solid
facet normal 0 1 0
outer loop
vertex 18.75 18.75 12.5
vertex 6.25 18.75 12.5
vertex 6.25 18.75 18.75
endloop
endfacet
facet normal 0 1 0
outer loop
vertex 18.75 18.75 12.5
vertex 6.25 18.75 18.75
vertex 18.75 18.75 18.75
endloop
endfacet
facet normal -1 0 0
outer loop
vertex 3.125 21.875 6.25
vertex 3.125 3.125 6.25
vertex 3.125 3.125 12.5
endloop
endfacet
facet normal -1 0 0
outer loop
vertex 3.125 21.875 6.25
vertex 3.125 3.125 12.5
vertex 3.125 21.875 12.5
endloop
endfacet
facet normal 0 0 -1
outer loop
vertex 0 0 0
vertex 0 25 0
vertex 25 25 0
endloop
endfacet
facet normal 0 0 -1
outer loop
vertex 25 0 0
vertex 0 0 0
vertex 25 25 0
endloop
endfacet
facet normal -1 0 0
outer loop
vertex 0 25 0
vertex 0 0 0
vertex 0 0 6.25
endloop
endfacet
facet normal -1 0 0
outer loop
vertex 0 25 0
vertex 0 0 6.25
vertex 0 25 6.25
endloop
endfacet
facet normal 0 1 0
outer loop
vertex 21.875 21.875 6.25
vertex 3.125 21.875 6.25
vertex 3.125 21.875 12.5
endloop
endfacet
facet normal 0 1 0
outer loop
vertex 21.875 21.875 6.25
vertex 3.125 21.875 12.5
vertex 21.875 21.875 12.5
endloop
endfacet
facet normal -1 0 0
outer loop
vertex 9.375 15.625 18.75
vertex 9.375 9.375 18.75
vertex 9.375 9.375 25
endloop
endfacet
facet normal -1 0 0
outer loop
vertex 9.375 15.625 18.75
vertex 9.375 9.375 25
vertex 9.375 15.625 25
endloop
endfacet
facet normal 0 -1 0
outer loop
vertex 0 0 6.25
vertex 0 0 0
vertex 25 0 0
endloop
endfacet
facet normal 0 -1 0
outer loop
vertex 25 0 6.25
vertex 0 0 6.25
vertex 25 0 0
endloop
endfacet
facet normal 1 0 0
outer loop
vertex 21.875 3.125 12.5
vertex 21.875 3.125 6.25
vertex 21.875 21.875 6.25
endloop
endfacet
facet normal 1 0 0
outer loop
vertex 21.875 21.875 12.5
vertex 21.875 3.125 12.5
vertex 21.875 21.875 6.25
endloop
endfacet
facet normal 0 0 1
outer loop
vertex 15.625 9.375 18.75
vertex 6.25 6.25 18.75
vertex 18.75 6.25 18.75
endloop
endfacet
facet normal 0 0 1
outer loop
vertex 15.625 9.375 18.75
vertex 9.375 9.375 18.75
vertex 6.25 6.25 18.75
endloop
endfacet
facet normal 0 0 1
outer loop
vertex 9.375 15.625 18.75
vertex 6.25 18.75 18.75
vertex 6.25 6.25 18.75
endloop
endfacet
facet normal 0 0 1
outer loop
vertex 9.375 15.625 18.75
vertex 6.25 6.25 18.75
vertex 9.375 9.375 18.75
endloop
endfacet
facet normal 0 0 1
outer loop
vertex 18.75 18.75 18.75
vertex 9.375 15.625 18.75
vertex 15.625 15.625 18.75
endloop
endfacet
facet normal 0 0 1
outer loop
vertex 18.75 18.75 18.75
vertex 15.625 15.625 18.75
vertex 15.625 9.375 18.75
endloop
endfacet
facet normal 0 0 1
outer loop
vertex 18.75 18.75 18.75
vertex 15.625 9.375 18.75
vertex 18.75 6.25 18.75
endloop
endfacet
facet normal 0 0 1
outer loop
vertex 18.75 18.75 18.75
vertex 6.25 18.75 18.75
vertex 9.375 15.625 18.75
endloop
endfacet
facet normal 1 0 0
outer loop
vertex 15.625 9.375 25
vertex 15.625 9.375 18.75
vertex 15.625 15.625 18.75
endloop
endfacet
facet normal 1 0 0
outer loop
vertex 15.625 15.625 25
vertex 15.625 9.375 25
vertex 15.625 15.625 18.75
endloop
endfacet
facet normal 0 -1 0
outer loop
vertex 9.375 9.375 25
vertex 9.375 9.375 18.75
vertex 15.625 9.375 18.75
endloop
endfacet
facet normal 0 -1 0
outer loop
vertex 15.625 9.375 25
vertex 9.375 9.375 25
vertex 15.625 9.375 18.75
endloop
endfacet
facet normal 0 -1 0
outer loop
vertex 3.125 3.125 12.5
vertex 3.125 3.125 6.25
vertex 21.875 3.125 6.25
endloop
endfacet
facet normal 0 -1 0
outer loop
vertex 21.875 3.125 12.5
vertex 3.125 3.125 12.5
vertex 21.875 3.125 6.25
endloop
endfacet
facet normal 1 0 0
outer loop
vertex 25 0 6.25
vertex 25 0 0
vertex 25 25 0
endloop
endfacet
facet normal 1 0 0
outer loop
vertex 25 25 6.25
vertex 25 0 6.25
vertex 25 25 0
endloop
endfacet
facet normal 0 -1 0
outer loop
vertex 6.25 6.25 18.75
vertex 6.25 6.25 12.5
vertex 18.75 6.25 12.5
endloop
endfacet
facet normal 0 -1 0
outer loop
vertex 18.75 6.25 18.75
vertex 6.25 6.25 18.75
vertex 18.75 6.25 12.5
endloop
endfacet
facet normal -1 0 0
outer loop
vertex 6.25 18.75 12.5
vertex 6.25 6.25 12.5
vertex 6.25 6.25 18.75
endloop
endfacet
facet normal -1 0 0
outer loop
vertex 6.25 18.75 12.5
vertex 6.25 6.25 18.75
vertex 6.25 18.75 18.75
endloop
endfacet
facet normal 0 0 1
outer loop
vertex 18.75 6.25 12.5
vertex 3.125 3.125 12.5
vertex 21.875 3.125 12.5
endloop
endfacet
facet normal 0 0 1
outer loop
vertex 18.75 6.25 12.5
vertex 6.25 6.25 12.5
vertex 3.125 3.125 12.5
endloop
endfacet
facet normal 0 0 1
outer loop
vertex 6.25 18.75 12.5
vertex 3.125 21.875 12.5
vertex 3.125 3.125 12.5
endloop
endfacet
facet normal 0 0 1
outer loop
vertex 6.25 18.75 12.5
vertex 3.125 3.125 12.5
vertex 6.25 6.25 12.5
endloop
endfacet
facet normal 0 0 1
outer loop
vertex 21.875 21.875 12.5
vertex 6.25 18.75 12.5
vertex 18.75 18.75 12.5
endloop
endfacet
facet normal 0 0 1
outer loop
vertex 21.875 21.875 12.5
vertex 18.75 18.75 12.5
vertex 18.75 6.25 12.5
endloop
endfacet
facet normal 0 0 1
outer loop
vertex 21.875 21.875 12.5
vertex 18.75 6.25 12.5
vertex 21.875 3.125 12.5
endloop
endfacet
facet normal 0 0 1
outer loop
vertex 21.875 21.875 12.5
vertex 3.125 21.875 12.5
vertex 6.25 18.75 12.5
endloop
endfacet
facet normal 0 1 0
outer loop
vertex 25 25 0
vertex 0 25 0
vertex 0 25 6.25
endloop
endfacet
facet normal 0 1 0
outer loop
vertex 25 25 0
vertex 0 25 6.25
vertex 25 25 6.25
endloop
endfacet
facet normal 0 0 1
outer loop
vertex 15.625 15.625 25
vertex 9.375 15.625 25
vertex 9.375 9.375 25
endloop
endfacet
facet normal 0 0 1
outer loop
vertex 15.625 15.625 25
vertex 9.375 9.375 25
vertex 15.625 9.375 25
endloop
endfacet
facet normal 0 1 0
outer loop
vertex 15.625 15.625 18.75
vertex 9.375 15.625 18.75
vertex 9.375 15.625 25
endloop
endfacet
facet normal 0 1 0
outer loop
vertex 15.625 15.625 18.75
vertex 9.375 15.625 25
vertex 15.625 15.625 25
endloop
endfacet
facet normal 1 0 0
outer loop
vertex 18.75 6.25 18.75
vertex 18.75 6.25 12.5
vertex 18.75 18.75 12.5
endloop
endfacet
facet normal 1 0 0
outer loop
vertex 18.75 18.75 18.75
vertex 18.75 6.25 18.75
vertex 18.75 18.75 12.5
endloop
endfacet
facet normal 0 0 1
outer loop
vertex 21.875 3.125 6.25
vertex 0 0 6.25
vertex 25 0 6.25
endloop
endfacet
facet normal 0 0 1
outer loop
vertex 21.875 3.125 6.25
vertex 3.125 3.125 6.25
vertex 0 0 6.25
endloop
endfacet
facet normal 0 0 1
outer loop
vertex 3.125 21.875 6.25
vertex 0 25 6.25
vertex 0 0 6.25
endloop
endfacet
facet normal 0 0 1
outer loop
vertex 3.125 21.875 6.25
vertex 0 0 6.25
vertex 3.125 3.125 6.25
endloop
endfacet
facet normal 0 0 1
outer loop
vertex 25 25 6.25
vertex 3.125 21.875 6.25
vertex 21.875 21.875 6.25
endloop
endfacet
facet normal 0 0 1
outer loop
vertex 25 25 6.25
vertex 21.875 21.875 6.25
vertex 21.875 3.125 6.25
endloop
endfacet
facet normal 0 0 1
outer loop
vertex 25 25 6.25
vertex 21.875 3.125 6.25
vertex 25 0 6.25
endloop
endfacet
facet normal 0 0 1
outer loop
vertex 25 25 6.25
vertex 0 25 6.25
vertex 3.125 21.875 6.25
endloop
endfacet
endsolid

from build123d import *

# Parameters (mm, degrees)
F1_W     = 25
F1_H     = 25
F1_W_2   = 18.75
F1_H_2   = 18.75
F2_DEPTH = 6.25
F1_W_3   = 12.5
F1_H_3   = 12.5
F3_DEPTH = 12.5
F1_W_4   = 6.25
F1_H_4   = 6.25
F4_DEPTH = 18.75
F5_DEPTH = 25


with BuildPart() as f2:
    # F1 (on Top) → F2 (new body)
    with BuildSketch(Plane.XY):
        with Locations((12.5, 12.5)):
            Rectangle(F1_W, F1_H)
        with Locations((12.5, 12.5)):
            Rectangle(F1_W_2, F1_H_2, mode=Mode.SUBTRACT)
    extrude(amount=F2_DEPTH)

    # F1 (on Top) → F3 (join)
    with BuildSketch(Plane.XY):
        with Locations((12.5, 12.5)):
            Rectangle(F1_W_2, F1_H_2)
        with Locations((12.5, 12.5)):
            Rectangle(F1_W_3, F1_H_3, mode=Mode.SUBTRACT)
    extrude(amount=F3_DEPTH)

    # F1 (on Top) → F4 (join)
    with BuildSketch(Plane.XY):
        with Locations((12.5, 12.5)):
            Rectangle(F1_W_3, F1_H_3)
        with Locations((12.5, 12.5)):
            Rectangle(F1_W_4, F1_H_4, mode=Mode.SUBTRACT)
    extrude(amount=F4_DEPTH)

    # F1 (on Top) → F5 (join)
    with BuildSketch(Plane.XY):
        with Locations((12.5, 12.5)):
            Rectangle(F1_W_4, F1_H_4)
    extrude(amount=F5_DEPTH)


solid = f2.part
